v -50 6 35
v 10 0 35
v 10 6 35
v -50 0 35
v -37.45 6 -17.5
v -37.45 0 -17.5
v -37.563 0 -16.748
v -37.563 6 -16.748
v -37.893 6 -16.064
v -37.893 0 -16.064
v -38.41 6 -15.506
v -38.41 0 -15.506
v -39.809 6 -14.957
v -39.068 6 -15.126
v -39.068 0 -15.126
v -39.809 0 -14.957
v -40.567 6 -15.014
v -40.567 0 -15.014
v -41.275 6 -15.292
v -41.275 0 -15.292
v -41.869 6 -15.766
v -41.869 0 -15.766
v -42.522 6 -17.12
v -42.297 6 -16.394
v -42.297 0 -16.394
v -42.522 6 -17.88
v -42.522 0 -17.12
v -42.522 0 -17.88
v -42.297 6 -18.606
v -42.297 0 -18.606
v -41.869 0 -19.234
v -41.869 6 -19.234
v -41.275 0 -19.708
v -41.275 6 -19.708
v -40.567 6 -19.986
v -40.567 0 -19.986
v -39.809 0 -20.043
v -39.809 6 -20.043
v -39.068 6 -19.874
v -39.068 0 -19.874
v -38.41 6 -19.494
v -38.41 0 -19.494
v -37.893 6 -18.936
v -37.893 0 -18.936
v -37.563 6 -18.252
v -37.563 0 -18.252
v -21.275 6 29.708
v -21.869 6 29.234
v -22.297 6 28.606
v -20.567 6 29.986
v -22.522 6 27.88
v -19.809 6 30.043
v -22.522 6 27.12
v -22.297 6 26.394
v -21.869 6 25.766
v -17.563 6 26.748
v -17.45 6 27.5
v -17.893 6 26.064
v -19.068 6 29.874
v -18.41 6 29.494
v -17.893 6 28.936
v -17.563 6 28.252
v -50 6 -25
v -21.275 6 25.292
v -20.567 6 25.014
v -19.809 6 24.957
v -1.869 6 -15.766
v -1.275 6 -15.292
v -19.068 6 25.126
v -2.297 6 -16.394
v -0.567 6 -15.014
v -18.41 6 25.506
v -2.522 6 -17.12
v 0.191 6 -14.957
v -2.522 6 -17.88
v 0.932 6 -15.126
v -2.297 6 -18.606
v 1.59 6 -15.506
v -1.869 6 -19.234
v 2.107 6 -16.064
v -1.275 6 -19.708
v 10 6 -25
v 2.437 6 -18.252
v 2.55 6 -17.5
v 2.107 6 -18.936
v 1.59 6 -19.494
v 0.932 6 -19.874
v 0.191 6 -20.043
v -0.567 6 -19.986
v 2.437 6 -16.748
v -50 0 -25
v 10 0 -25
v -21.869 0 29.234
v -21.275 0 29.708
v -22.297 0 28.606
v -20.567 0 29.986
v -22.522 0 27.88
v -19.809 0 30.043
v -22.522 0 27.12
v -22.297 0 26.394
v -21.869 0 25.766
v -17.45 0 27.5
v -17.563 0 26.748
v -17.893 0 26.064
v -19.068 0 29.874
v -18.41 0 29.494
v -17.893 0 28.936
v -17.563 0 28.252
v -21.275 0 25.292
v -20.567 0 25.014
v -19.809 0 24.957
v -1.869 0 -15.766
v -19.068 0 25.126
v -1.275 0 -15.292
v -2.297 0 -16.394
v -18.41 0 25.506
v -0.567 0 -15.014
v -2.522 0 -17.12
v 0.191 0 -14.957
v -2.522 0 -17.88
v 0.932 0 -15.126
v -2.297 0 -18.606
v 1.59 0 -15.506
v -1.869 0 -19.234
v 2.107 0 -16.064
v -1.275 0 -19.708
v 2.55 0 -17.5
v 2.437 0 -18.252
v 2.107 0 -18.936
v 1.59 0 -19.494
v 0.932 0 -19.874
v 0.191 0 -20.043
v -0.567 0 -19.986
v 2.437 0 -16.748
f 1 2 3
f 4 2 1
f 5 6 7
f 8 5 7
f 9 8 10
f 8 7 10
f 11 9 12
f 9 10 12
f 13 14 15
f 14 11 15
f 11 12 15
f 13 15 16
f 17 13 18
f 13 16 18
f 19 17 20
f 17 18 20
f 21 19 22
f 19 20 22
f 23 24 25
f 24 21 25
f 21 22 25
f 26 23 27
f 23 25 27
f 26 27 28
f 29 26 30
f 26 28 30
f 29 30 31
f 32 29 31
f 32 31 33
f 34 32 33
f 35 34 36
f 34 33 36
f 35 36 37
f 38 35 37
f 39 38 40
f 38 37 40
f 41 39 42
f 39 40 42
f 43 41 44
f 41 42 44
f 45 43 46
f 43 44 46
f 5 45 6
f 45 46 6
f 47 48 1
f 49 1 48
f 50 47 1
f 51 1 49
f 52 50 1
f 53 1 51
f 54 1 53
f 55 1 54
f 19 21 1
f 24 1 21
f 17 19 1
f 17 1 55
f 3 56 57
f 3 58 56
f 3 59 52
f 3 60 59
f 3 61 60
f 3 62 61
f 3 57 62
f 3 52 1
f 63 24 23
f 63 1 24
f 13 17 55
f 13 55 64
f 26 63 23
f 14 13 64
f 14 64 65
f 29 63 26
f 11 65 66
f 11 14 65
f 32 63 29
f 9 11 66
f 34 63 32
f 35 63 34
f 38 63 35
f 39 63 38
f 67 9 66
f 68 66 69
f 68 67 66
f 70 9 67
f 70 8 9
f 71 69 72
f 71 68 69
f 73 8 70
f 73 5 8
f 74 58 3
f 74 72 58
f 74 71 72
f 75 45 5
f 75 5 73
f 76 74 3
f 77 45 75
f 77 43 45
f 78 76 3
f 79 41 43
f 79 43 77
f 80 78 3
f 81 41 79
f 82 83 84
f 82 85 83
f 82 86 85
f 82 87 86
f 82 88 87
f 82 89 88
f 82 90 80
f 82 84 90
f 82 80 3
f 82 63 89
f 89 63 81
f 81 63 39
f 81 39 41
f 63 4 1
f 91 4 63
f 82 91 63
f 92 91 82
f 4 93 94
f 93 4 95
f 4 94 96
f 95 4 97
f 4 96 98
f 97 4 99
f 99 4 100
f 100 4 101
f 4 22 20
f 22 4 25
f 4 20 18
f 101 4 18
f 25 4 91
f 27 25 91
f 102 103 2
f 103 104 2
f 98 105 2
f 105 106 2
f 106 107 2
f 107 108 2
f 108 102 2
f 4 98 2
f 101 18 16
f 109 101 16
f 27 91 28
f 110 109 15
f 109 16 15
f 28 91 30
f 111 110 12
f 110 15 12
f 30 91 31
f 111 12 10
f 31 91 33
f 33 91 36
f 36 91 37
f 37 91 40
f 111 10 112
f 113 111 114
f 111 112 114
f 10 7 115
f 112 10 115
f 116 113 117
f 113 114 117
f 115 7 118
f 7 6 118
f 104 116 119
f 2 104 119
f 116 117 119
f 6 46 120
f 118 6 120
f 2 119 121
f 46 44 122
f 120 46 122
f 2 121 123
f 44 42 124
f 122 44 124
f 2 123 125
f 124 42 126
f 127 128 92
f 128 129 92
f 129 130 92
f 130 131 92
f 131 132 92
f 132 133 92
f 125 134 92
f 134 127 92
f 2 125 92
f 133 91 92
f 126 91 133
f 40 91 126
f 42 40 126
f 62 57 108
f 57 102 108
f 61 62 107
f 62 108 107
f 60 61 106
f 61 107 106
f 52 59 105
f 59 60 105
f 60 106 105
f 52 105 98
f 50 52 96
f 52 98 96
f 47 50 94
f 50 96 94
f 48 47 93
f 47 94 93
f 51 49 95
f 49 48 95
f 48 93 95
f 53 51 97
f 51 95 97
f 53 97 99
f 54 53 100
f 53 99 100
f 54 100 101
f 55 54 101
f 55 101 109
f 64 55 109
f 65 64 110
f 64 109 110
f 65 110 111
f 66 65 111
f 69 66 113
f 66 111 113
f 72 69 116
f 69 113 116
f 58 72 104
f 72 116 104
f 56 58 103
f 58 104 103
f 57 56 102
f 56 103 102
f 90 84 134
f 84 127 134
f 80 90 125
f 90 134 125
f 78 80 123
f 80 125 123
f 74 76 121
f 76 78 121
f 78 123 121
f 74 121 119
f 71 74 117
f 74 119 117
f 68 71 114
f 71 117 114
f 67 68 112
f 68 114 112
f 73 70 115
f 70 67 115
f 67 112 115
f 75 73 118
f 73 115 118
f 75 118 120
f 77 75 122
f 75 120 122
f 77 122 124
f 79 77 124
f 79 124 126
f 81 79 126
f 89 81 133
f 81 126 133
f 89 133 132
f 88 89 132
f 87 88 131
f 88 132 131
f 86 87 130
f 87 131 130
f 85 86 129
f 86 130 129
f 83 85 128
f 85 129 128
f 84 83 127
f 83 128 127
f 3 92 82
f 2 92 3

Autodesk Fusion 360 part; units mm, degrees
sketch "Sketch1" plane through (0, 0, 0) normal (0, 1, 0) x (1, 0, 0)
  line L0 (-50, 25) -> (10, 25)
  line L1 (10, 25) -> (10, -35)
  line L2 (10, -35) -> (-50, -35)
  line L3 (-50, -35) -> (-50, 25)
  line L4 (-20, -50) -> (-20, 45) construction
  line L5 (30, -5) -> (-85, -5) construction
  line L6 (-85, 17.5) -> (30, 17.5) construction
  line L7 (-85, -27.5) -> (30, -27.5) construction
  circle A0 centre (-40, 17.5) radius 2.55
  circle A1 centre (0, 17.5) radius 2.55
  circle A2 centre (-20, -27.5) radius 2.55
  dimension "d1" = 60
  dimension "d2" = 60
  dimension "d3" = 22.5
  dimension "d4" = 5.1
  dimension "d5" = 5.1
extrude "Extrude1" add sketch "Sketch1" along normal blind 6
sketch "Sketch3" plane through (0, 6, 0) normal (0, 1, 0) x (-1, 0, 0)
  circle A0 centre (40, -17.5) radius 2.55
  circle A1 centre (20, 27.5) radius 2.55
  circle A2 centre (0, -17.5) radius 2.55
  line L0 (50, 35) -> (-10, 35)
  line L1 (-10, 35) -> (-10, -25)
  line L2 (-10, -25) -> (50, -25)
  line L3 (50, -25) -> (50, 35)
equation "d3 = separation / 2"
equation "d4 = hole_01"
equation "d5 = hole_01"
equation "separation = 45 mm"
equation "hole_01 = 5.1 mm"
